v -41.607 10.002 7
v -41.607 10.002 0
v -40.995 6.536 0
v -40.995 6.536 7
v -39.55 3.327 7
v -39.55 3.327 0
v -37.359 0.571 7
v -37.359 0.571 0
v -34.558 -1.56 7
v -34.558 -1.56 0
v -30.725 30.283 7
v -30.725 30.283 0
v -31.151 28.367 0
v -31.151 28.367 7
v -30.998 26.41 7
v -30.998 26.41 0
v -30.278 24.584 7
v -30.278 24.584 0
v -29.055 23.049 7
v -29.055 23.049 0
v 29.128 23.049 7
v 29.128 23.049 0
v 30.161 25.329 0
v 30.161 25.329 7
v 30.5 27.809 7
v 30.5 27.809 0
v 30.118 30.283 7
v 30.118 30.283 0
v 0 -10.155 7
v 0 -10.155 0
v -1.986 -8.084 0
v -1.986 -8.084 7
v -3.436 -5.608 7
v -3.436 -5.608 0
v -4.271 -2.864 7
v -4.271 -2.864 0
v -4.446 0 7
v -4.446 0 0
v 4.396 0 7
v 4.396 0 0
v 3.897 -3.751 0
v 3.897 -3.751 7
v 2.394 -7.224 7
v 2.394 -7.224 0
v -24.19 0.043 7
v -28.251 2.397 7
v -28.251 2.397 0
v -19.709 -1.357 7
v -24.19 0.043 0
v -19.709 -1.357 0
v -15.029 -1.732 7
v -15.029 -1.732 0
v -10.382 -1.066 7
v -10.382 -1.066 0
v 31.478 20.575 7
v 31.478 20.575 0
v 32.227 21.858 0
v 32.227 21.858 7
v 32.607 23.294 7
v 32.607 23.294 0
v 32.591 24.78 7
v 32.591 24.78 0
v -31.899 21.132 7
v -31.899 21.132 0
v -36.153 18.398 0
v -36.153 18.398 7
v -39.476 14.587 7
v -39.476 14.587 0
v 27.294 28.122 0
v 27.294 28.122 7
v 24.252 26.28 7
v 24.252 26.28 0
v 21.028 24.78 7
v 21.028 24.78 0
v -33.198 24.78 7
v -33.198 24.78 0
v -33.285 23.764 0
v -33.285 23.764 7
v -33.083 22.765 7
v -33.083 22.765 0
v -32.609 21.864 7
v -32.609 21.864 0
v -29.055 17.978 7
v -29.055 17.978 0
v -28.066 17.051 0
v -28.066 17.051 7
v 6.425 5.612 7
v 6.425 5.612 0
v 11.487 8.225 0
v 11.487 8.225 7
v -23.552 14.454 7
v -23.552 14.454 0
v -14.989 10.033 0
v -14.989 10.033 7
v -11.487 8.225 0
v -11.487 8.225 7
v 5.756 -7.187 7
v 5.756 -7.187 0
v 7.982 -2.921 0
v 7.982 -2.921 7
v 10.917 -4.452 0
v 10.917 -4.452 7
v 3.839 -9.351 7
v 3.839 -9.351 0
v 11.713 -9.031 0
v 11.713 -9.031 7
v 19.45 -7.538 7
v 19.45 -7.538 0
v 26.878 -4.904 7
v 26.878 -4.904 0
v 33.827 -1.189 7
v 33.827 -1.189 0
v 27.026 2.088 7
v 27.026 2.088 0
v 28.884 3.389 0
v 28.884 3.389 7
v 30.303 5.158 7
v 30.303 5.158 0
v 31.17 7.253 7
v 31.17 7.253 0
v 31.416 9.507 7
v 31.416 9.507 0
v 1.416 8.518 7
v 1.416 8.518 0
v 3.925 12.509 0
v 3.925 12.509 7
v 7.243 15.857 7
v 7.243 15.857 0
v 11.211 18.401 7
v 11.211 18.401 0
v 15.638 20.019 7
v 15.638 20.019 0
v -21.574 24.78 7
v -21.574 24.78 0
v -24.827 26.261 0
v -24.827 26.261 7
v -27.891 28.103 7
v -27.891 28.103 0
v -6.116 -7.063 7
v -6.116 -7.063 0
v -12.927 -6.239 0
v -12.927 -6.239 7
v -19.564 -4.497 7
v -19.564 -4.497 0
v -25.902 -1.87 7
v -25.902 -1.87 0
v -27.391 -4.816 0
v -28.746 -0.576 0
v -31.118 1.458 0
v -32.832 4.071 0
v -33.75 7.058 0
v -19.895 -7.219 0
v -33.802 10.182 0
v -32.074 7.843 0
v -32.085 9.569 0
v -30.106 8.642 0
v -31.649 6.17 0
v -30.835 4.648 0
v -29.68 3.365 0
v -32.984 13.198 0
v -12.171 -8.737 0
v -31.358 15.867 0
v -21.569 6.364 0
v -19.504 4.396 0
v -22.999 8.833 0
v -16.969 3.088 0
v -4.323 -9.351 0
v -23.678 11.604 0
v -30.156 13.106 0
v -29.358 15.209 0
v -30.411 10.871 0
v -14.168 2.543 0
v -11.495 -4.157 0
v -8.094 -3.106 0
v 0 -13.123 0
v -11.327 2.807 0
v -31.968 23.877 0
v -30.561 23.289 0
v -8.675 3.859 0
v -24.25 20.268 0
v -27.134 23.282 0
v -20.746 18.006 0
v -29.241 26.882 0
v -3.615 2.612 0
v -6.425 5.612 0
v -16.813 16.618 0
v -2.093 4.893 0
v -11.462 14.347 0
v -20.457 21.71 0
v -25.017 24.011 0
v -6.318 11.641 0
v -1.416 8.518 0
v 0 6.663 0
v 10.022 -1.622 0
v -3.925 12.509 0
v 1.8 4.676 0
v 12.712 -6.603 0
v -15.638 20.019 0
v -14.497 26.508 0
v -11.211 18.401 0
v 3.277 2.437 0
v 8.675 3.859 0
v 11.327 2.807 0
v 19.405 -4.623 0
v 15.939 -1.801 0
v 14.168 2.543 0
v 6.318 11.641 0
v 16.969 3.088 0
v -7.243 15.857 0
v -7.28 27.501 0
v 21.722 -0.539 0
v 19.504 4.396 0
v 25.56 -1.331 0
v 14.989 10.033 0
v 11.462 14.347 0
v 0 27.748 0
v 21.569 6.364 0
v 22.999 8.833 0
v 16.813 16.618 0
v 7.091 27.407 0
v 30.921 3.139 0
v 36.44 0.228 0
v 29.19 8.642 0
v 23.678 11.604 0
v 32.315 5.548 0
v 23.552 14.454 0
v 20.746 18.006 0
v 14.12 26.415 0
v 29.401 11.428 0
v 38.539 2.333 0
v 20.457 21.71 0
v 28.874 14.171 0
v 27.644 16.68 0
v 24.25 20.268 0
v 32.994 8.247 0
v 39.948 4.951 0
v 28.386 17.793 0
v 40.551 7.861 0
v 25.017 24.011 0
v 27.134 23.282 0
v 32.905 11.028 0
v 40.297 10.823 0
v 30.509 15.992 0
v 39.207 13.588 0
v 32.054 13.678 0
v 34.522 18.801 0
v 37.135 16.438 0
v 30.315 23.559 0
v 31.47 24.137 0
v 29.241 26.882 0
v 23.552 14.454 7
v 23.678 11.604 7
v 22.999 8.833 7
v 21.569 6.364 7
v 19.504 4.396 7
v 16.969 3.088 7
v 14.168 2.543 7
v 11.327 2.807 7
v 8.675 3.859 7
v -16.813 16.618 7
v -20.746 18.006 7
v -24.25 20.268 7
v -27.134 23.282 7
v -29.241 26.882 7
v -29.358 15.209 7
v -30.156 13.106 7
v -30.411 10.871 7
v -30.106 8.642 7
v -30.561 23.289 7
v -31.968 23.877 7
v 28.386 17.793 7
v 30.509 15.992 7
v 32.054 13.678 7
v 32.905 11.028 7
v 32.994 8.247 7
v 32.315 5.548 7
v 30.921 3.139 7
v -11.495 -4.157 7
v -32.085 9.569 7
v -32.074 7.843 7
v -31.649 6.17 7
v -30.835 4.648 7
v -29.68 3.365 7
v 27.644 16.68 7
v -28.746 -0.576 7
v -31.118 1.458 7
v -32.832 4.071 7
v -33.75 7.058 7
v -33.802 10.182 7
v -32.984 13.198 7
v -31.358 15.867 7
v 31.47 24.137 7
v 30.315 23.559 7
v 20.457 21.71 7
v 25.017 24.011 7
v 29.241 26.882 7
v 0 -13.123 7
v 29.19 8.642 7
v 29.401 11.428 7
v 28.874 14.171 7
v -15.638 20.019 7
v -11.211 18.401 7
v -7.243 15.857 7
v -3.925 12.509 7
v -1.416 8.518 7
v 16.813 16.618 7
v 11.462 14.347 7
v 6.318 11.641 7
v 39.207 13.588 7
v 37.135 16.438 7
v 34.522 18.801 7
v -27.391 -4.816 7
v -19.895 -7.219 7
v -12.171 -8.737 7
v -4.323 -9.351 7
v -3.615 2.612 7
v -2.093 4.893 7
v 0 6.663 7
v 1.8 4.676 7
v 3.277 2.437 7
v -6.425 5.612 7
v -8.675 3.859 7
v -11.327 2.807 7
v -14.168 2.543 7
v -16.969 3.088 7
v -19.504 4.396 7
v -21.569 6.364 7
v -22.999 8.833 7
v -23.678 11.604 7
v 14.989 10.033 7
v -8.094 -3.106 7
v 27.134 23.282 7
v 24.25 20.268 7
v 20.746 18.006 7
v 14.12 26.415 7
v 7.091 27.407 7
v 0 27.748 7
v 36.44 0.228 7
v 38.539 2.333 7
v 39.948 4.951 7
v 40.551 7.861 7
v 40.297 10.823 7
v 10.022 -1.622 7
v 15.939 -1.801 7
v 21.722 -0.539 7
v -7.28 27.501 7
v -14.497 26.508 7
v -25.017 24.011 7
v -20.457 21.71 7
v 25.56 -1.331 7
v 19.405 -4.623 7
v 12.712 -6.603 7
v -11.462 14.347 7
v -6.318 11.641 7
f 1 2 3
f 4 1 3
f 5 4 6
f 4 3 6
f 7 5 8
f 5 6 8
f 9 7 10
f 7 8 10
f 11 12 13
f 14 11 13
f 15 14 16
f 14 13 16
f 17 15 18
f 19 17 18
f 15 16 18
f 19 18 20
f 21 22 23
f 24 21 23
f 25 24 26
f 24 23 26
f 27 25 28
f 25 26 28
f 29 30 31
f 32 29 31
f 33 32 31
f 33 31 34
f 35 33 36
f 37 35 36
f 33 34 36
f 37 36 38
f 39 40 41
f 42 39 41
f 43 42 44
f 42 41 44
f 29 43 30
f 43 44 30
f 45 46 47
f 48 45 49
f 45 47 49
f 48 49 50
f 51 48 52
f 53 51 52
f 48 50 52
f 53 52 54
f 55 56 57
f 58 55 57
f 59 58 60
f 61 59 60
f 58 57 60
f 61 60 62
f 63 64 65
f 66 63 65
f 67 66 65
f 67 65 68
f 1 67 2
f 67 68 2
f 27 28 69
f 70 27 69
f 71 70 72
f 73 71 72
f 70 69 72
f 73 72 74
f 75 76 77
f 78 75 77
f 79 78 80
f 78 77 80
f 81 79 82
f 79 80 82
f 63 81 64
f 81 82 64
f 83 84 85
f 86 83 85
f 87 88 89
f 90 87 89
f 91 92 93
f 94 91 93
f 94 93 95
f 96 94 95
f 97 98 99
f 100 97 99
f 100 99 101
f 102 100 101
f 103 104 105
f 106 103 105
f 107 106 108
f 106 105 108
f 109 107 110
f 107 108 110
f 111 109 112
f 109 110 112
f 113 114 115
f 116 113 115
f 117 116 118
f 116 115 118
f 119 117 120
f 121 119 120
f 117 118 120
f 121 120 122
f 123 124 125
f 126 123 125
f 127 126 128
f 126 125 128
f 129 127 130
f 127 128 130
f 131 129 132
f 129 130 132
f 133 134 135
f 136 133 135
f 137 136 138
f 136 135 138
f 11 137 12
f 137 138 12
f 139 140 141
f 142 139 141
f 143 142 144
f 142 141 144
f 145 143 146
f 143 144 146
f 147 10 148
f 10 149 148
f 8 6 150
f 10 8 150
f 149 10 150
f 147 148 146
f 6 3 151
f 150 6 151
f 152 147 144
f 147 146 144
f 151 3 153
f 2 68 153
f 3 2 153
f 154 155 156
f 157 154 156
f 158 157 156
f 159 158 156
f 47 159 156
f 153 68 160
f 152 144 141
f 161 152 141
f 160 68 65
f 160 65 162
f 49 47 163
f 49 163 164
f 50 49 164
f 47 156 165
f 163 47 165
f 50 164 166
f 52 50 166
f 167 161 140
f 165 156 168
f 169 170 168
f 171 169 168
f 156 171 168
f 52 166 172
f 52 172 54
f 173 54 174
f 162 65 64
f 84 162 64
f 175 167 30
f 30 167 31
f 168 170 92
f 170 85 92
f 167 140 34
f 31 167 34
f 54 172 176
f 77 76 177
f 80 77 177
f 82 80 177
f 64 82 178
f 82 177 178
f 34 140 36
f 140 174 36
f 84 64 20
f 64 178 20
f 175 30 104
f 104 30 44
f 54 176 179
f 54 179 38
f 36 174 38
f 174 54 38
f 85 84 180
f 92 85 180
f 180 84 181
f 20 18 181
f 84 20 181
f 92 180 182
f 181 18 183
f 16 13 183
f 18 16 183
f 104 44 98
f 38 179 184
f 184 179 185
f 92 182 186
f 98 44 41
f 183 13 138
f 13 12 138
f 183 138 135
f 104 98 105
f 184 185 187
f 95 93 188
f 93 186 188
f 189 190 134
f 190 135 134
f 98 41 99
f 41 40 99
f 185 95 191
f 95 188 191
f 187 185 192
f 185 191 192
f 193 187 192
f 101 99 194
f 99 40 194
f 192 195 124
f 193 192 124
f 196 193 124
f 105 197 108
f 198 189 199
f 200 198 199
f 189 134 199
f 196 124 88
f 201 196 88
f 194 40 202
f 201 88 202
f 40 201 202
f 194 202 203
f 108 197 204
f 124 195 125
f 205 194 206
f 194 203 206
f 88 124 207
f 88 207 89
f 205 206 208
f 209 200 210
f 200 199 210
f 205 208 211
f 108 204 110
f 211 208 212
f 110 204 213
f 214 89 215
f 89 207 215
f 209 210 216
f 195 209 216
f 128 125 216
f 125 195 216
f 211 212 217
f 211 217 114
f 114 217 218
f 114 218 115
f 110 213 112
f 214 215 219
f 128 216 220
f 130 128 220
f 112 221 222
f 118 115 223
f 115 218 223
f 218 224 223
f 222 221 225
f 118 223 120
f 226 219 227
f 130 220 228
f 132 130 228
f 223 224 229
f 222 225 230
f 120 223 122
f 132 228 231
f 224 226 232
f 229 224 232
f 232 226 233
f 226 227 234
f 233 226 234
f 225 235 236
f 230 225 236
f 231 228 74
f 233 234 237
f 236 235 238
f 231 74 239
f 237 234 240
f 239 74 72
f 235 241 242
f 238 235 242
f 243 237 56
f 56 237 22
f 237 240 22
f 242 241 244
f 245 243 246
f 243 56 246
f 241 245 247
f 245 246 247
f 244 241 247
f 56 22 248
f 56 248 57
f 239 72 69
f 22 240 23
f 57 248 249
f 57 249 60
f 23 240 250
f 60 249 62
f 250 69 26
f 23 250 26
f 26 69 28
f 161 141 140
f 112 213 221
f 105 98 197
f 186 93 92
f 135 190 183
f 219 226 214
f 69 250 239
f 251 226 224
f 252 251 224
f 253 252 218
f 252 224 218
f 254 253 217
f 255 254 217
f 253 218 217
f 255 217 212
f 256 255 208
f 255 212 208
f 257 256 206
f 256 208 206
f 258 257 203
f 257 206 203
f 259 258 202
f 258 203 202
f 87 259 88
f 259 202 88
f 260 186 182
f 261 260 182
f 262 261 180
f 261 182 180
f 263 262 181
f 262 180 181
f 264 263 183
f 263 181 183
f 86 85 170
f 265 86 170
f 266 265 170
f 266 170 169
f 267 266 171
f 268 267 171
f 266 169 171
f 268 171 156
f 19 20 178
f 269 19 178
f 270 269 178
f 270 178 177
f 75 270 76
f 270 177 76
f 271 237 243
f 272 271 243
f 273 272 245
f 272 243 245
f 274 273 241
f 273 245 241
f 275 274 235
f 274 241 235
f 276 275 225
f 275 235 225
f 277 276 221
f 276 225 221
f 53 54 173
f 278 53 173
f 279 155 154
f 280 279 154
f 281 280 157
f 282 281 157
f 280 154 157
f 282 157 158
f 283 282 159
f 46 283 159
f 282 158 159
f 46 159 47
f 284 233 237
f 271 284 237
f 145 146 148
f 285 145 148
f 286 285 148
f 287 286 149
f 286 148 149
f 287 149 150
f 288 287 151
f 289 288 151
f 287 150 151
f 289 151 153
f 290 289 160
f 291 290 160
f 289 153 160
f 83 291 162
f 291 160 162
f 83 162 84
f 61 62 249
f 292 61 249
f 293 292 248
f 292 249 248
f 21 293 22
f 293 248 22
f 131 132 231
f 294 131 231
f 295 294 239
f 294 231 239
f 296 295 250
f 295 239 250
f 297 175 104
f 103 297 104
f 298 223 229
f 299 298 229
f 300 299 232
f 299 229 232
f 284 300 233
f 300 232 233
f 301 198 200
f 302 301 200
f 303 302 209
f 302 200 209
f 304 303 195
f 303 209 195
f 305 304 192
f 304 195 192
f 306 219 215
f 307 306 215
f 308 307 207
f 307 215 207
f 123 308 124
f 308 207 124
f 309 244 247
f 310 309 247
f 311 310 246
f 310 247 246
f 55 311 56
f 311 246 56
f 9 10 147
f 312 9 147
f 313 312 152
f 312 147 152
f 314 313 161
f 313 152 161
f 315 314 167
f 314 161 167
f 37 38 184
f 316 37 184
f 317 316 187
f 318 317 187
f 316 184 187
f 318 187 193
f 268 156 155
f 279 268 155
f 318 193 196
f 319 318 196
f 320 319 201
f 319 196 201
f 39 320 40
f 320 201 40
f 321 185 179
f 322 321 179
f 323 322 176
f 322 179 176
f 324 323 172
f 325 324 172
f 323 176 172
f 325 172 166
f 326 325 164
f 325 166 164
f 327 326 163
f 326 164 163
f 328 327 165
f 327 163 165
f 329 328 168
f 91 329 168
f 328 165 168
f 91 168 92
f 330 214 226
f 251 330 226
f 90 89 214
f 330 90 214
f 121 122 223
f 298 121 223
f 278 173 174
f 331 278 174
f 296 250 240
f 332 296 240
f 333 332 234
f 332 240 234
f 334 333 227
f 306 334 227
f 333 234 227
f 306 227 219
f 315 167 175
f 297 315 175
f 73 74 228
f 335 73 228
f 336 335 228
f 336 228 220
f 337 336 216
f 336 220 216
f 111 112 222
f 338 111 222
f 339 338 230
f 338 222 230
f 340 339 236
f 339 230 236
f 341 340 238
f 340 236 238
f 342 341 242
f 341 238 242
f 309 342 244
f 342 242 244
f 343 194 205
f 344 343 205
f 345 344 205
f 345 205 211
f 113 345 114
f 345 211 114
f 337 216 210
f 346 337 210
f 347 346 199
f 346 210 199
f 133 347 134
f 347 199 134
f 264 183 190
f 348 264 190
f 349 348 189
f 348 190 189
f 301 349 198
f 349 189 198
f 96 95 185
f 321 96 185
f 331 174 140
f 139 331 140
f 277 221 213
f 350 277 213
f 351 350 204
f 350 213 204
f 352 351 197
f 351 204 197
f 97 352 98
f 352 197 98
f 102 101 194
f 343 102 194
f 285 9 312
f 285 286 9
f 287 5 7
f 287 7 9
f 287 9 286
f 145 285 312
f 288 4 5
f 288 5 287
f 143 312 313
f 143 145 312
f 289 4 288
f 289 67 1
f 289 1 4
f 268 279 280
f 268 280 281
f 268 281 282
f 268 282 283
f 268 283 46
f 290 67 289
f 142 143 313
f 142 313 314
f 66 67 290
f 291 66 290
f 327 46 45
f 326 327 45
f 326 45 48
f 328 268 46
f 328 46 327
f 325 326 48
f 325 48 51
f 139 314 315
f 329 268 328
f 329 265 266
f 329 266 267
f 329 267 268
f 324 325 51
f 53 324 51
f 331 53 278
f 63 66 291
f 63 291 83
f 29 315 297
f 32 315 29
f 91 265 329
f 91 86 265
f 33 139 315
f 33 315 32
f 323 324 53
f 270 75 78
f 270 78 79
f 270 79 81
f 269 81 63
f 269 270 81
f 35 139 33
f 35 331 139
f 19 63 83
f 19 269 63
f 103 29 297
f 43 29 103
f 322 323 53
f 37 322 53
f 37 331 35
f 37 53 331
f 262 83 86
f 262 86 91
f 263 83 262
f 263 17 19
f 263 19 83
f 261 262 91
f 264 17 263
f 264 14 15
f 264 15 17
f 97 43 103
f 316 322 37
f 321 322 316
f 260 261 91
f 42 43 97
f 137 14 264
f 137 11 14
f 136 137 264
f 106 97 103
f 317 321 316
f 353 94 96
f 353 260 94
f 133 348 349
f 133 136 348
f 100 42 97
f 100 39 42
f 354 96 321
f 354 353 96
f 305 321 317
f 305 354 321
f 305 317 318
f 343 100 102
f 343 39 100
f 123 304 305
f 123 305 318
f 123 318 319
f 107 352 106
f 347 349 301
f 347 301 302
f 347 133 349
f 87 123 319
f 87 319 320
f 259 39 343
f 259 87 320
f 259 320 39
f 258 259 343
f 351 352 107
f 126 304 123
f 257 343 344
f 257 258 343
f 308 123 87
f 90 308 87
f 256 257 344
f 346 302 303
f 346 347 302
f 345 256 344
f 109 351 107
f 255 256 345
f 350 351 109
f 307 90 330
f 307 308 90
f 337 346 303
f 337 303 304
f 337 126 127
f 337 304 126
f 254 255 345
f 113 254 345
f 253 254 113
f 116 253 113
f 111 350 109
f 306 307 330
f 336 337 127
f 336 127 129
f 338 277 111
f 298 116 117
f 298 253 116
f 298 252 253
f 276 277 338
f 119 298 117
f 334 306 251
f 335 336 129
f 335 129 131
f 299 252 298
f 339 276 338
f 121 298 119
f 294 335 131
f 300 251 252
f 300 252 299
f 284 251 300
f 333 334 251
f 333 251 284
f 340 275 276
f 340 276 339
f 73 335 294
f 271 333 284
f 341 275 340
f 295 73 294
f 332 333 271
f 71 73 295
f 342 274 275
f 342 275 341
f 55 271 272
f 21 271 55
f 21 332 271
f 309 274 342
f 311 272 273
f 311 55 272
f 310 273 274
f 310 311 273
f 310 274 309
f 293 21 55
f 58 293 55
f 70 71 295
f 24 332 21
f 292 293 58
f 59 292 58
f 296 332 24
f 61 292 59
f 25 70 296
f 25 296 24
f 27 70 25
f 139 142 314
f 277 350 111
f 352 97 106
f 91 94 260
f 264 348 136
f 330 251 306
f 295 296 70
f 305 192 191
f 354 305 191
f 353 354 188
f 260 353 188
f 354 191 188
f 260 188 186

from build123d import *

# Parameters (mm, degrees)
F1_DEPTH = 7


with BuildPart() as f1:
    # F0 (on Top) → F1 (new body)
    with BuildSketch(Plane.XY):
        with BuildLine():
            ThreePointArc((-33.1978872418, 24.7798599303), (-33.0834757558, 22.7654689427), (-31.8994224072, 21.131798625))
            ThreePointArc((-31.8994224072, 21.131798625), (-37.9491495245, 16.6100964199), (-41.6069738567, 10.002123192))
            ThreePointArc((-41.6069738567, 10.002123192), (-39.5495454522, 3.3265737687), (-34.5581807196, -1.5603731154))
            ThreePointArc((-34.5581807196, -1.5603731154), (-19.8946406078, -7.2187581256), (-4.3225614354, -9.3511464074))
            Line((-4.3225614354, -9.3511464074), (0, -13.1228696555))
            Line((0, -13.1228696555), (3.8392005954, -9.3511464074))
            ThreePointArc((3.8392005954, -9.3511464074), (19.4504731476, -7.5377401012), (33.8274911046, -1.1893837946))
            ThreePointArc((33.8274911046, -1.1893837946), (39.9482242909, 4.9505196785), (39.2068363726, 13.5883511975))
            ThreePointArc((39.2068363726, 13.5883511975), (35.8899105198, 17.6875243488), (31.477894634, 20.5753147602))
            ThreePointArc((31.477894634, 20.5753147602), (32.4658862333, 22.5633647209), (32.5908623636, 24.7798599303))
            ThreePointArc((32.5908623636, 24.7798599303), (30.8966861442, 23.8400043647), (29.1282963008, 23.0485759676))
            ThreePointArc((29.1282963008, 23.0485759676), (30.4199988214, 26.5567217253), (30.1176030189, 30.2828643471))
            ThreePointArc((30.1176030189, 30.2828643471), (25.7979668662, 27.1597634239), (21.0283678025, 24.7798599303))
            ThreePointArc((21.0283678025, 24.7798599303), (10.6169463492, 26.9919126813), (0, 27.747772634))
            ThreePointArc((0, 27.747772634), (-10.9014405907, 27.0972820622), (-21.5735584497, 24.7798599303))
            ThreePointArc((-21.5735584497, 24.7798599303), (-26.3855190932, 27.1382027062), (-30.7246260345, 30.2828643471))
            ThreePointArc((-30.7246260345, 30.2828643471), (-30.9978734662, 26.4100339617), (-29.0551744401, 23.0485759676))
            ThreePointArc((-29.0551744401, 23.0485759676), (-31.282323769, 23.5414279438), (-33.1978872418, 24.7798599303))
        make_face()
        with BuildLine():
            ThreePointArc((-25.9017664939, -1.8695309991), (-33.7503475703, 7.0579634382), (-29.0551744401, 17.9783906788))
            Line((-29.0551744401, 17.9783906788), (-28.0658695847, 17.0509181917))
            ThreePointArc((-28.0658695847, 17.0509181917), (-30.1557554553, 13.105925168), (-30.106311664, 8.6418297142))
            Line((-30.106311664, 8.6418297142), (-32.0849195123, 9.5693022013))
            ThreePointArc((-32.0849195123, 9.5693022013), (-31.2882621481, 5.3843879138), (-28.2513629645, 2.3968447931))
            ThreePointArc((-28.2513629645, 2.3968447931), (-19.7085629501, -1.3566931507), (-10.3820515797, -1.0657209205))
            Line((-10.3820515797, -1.0657209205), (-11.4950193092, -4.1572973132))
            Line((-11.4950193092, -4.1572973132), (-8.0942846835, -3.1061612535))
            Line((-8.0942846835, -3.1061612535), (-6.1156759039, -7.0633799769))
            ThreePointArc((-6.1156759039, -7.0633799769), (-16.2750356162, -5.4809865628), (-25.9017664939, -1.8695309991))
        make_face(mode=Mode.SUBTRACT)
        with BuildLine():
            ThreePointArc((-6.4248335548, 5.6120846421), (-18.2829236305, 3.6515341791), (-23.5521681607, 14.4539931789))
            Line((-23.5521681607, 14.4539931789), (-14.9885008577, 10.0330389105))
            Line((-14.9885008577, 10.0330389105), (-11.4866484755, 8.2252235565))
            Line((-11.4866484755, 8.2252235565), (-6.4248335548, 5.6120846421))
        make_face(mode=Mode.SUBTRACT)
        with BuildLine():
            ThreePointArc((0, -10.1549560204), (-3.4356645233, -5.608379356), (-4.4462243095, 0))
            ThreePointArc((-4.4462243095, 0), (-2.9338853411, 3.8058939588), (0, 6.6632204689))
            ThreePointArc((0, 6.6632204689), (2.5812160346, 3.5845194486), (4.395684693, 0))
            ThreePointArc((4.395684693, 0), (3.2653866019, -5.5395763131), (0, -10.1549560204))
        make_face(mode=Mode.SUBTRACT)
        with BuildLine():
            ThreePointArc((28.3863190562, 17.7928954363), (32.9046262681, 11.0282269807), (30.9214107692, 3.138822969))
            ThreePointArc((30.9214107692, 3.138822969), (19.4051476303, -4.6231903079), (5.7559781708, -7.187042851))
            Line((5.7559781708, -7.187042851), (7.9819131643, -2.9206669424))
            Line((7.9819131643, -2.9206669424), (10.9170274232, -4.4520307225))
            Line((10.9170274232, -4.4520307225), (10.0223543122, -1.6222046688))
            ThreePointArc((10.0223543122, -1.6222046688), (18.8690080758, -1.3476793334), (27.0260237157, 2.0876871422))
            ThreePointArc((27.0260237157, 2.0876871422), (30.3026103064, 5.1576516383), (31.4160622656, 9.5074707642))
            Line((31.4160622656, 9.5074707642), (29.1901286691, 8.6418297142))
            ThreePointArc((29.1901286691, 8.6418297142), (29.2288443333, 12.8169576264), (27.6443399489, 16.6799277067))
            Line((27.6443399489, 16.6799277067), (28.3863190562, 17.7928954363))
        make_face(mode=Mode.SUBTRACT)
        with BuildLine():
            Line((11.4866484755, 8.2252235565), (14.9885008577, 10.0330389105))
            Line((14.9885008577, 10.0330389105), (23.5521681607, 14.4539931789))
            ThreePointArc((23.5521681607, 14.4539931789), (18.2829236305, 3.6515341791), (6.4248335548, 5.6120846421))
            Line((6.4248335548, 5.6120846421), (11.4866484755, 8.2252235565))
        make_face(mode=Mode.SUBTRACT)
        with BuildLine():
            ThreePointArc((-16.8125312775, 16.618097201), (-24.2503546691, 20.26833819), (-29.24066782, 26.8821306527))
            ThreePointArc((-29.24066782, 26.8821306527), (-22.7740559507, 22.7868013128), (-15.6377311796, 20.0188308954))
            ThreePointArc((-15.6377311796, 20.0188308954), (-7.2427370511, 15.8566956525), (-1.4164794702, 8.5181659088))
            ThreePointArc((-1.4164794702, 8.5181659088), (-8.8622483515, 13.047612435), (-16.8125312775, 16.618097201))
        make_face(mode=Mode.SUBTRACT)
        with BuildLine():
            ThreePointArc((16.8125312775, 16.618097201), (8.8622483515, 13.047612435), (1.4164794702, 8.5181659088))
            ThreePointArc((1.4164794702, 8.5181659088), (7.2427370511, 15.8566956525), (15.6377311796, 20.0188308954))
            ThreePointArc((15.6377311796, 20.0188308954), (22.7740559507, 22.7868013128), (29.24066782, 26.8821306527))
            ThreePointArc((29.24066782, 26.8821306527), (24.2503546691, 20.26833819), (16.8125312775, 16.618097201))
        make_face(mode=Mode.SUBTRACT)
    extrude(amount=F1_DEPTH)


solid = f1.part
